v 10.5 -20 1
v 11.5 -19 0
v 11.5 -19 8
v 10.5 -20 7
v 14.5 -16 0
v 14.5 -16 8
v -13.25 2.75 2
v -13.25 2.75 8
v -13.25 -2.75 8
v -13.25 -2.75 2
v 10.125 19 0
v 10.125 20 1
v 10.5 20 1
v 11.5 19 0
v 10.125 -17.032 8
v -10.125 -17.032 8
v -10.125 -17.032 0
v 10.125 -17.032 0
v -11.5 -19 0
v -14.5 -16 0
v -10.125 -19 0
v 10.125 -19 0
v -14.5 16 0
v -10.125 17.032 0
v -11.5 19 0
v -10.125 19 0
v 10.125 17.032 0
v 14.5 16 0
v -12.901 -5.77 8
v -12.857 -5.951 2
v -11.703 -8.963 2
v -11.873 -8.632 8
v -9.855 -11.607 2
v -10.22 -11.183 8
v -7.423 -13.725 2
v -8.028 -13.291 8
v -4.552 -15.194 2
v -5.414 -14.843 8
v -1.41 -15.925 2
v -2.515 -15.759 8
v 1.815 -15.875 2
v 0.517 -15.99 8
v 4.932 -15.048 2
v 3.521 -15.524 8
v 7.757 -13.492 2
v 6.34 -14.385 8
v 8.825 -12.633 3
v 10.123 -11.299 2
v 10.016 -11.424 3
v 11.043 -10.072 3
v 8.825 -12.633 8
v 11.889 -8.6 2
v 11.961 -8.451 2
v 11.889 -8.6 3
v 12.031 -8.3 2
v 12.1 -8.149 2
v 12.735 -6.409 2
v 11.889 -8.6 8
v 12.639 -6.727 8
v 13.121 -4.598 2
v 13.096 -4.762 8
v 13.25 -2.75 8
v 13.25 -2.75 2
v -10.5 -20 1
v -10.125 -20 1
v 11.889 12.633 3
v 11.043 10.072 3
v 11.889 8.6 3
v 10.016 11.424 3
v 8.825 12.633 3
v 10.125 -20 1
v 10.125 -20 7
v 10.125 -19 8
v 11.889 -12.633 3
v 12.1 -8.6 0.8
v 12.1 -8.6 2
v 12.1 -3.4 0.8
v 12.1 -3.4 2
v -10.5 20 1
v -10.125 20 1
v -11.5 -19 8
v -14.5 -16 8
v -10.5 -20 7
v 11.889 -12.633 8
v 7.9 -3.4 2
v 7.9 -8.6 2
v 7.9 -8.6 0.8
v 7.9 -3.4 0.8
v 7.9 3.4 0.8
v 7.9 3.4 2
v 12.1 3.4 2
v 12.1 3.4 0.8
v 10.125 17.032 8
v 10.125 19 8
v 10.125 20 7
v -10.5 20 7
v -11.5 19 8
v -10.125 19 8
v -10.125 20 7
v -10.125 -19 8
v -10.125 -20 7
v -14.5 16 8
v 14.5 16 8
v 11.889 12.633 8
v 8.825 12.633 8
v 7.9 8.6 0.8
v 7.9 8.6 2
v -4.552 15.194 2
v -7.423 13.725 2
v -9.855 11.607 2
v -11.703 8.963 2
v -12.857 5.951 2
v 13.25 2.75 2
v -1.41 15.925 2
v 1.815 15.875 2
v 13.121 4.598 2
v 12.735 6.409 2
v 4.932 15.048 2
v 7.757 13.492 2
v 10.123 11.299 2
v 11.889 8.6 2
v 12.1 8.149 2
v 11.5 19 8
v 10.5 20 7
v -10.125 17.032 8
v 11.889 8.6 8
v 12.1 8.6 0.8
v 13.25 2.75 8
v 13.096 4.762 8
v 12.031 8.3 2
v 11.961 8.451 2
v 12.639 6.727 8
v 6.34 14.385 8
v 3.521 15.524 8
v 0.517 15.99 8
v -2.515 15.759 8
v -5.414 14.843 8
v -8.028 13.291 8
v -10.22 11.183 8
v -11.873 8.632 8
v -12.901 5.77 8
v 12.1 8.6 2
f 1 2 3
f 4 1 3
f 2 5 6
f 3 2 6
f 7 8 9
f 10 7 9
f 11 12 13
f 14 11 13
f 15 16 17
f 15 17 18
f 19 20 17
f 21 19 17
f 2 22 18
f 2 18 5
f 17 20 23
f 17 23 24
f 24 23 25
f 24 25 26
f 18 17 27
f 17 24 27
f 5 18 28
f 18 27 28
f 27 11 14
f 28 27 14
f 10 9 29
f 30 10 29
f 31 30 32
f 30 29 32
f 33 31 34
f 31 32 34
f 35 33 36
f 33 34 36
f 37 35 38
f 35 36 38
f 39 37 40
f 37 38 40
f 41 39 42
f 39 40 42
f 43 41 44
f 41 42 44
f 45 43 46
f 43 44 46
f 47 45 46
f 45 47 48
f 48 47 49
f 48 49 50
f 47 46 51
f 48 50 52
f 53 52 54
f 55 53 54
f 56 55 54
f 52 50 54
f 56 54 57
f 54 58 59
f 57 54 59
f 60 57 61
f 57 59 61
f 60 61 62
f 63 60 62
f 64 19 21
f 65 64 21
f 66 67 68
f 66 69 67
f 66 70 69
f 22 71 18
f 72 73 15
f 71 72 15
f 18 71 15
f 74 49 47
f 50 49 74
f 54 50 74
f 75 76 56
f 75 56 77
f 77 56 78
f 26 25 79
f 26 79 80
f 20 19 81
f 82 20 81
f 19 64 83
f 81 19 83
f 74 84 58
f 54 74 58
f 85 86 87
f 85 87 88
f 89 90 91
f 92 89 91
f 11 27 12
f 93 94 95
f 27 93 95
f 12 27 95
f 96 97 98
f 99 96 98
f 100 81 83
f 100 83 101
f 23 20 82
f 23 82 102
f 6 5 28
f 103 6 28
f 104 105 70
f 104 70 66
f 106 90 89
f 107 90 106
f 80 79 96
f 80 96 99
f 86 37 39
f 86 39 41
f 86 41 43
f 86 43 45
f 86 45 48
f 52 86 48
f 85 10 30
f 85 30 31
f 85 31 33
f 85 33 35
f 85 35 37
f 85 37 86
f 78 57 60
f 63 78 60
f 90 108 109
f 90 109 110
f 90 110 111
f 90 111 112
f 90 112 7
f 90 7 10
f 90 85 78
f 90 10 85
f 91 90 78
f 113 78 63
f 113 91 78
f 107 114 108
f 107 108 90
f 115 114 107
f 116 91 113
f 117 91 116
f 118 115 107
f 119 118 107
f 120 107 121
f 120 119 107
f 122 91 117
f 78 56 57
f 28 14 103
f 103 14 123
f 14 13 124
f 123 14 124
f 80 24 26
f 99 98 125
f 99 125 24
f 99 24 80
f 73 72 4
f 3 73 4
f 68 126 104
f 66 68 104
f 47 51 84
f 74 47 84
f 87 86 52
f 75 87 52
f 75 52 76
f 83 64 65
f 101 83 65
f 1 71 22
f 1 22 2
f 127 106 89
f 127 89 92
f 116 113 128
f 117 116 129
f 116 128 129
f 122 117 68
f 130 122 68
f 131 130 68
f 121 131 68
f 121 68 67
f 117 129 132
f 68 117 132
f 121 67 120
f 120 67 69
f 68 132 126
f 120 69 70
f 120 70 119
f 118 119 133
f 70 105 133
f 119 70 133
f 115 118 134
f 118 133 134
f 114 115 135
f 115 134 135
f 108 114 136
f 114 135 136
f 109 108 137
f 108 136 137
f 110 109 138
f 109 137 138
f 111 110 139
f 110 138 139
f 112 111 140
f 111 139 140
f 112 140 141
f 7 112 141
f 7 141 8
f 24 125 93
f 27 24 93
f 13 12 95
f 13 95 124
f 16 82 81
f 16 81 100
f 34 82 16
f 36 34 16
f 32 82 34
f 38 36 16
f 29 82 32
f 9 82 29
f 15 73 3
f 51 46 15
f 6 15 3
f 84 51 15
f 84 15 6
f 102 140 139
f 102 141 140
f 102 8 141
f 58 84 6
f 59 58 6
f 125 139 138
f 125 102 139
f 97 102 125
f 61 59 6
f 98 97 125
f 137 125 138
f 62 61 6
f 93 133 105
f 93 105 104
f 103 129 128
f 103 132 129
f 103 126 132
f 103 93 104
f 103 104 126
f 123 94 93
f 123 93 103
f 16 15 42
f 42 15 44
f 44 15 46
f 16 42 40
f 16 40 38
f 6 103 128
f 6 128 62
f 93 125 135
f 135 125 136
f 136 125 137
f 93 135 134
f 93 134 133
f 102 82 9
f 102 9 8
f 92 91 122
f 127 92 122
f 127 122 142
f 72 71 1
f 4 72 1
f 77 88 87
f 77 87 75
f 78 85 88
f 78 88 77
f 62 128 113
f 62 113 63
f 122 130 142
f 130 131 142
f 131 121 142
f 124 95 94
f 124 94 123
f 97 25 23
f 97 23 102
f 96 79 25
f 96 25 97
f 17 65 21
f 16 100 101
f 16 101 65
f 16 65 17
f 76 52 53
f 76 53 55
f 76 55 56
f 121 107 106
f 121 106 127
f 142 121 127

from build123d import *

# Parameters (mm, degrees)
SKETCH_W        = 29
SKETCH_H        = 40
PAD_DEPTH       = 8
CHAMFER_SIZE    = 4
CHAMFER001_SIZE = 1
SKETCH001_W     = 20.25
SKETCH001_H     = 20
POCKET_DEPTH    = 15
POCKET001_DEPTH = 6
SKETCH003_W     = 17.593698
SKETCH003_H     = 25.266384
POCKET002_DEPTH = 5
SKETCH004_W     = 4.2
SKETCH004_H     = 5.2
POCKET003_DEPTH = 1.2


with BuildPart() as part:
    # Sketch (on XY_Plane of Origin) → Pad (new body)
    with BuildSketch(Plane.XY):
        Rectangle(SKETCH_W, SKETCH_H)
    extrude(amount=PAD_DEPTH)

    # Chamfer
    chamfer_edges = [part.edges().sort_by_distance(p)[0] for p in [
        (14.5, 20, 4),
        (14.5, -20, 4),
        (-14.5, 20, 4),
        (-14.5, -20, 4),
    ]]
    chamfer(chamfer_edges, length=CHAMFER_SIZE)

    # Chamfer001
    chamfer001_edges = [part.edges().sort_by_distance(p)[0] for p in [
        (0, -20, 0),
        (0, -20, 8),
        (0, 20, 0),
        (0, 20, 8),
    ]]
    chamfer(chamfer001_edges, length=CHAMFER001_SIZE)

    # Sketch001 (on Face8 of Chamfer001) → Pocket (cut)
    with BuildSketch(Plane.XY.offset(8)):
        with Locations((0, -27.031727)):
            Rectangle(SKETCH001_W, SKETCH001_H)
        with Locations((0, 27.031727)):
            Rectangle(SKETCH001_W, SKETCH001_H)
    extrude(amount=-POCKET_DEPTH, mode=Mode.SUBTRACT)

    # Sketch002 (on Face7 of Pocket) → Pocket001 (cut)
    with BuildSketch(Plane.XY.offset(8)):
        with BuildLine():
            ThreePointArc((13.25, 2.75), (0, 16), (-13.25, 2.75))
            Line((-13.25, 2.75), (-13.25, -2.75))
            ThreePointArc((-13.25, -2.75), (0, -16), (13.25, -2.75))
            Line((13.25, 2.75), (13.25, -2.75))
        make_face()
    extrude(amount=-POCKET001_DEPTH, mode=Mode.SUBTRACT)

    # Sketch003 (on Face7 of Pocket001) → Pocket002 (cut)
    with BuildSketch(Plane.XY.offset(8)):
        with Locations((3.091955, 0)):
            Rectangle(SKETCH003_W, SKETCH003_H)
    extrude(amount=-POCKET002_DEPTH, mode=Mode.SUBTRACT)

    # Sketch004 (on Face36 of Pocket002) → Pocket003 (cut)
    with BuildSketch(Plane.XY.offset(2)):
        with Locations((10, -6)):
            Rectangle(SKETCH004_W, SKETCH004_H)
        with Locations((10, 6)):
            Rectangle(SKETCH004_W, SKETCH004_H)
    extrude(amount=-POCKET003_DEPTH, mode=Mode.SUBTRACT)


solid = part.part
